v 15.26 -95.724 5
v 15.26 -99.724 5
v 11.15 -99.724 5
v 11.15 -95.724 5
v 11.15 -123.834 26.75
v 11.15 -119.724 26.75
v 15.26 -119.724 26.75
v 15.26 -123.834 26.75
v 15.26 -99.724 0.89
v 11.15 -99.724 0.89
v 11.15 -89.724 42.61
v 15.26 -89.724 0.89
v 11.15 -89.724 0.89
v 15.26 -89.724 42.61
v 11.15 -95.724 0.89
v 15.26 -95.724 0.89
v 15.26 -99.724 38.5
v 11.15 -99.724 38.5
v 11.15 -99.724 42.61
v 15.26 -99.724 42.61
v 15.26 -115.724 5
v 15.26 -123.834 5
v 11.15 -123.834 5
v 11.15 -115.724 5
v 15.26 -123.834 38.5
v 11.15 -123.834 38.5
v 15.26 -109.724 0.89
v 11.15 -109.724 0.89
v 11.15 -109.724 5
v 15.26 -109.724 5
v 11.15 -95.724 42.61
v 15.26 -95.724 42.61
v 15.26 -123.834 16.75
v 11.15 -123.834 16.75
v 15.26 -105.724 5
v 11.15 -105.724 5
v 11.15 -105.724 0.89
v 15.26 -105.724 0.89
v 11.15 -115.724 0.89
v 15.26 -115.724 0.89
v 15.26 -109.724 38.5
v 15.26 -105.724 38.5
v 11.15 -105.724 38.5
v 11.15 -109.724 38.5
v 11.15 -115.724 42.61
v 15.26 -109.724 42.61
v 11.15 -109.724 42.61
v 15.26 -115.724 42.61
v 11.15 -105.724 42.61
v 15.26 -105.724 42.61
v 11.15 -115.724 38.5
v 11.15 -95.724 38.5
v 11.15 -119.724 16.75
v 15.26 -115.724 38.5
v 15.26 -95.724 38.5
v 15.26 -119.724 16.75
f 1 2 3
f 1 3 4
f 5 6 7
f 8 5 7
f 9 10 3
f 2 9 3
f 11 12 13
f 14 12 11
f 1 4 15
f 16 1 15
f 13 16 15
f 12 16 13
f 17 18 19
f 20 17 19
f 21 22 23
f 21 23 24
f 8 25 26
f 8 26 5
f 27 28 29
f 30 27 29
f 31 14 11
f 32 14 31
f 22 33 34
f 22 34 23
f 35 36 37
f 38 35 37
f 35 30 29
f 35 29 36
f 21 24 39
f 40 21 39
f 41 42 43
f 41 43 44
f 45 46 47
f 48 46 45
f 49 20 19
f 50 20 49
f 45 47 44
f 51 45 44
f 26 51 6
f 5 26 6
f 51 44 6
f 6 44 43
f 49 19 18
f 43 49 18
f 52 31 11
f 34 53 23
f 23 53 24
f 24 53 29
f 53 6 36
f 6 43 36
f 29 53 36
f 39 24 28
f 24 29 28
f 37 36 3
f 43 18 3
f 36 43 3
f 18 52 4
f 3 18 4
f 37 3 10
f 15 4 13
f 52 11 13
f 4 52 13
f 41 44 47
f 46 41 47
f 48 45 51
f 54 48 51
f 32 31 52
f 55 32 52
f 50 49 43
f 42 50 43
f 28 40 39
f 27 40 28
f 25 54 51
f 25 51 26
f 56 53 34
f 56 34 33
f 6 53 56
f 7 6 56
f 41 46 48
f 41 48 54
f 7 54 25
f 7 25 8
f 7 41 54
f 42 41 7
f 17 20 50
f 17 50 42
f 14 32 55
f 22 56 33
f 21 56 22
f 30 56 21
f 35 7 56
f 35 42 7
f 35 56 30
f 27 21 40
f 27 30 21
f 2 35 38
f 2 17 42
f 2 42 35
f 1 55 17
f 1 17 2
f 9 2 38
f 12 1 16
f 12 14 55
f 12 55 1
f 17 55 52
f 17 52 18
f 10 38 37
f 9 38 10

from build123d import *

# Parameters (mm, degrees)
BOSS_EXTRUDE1_DEPTH     = 4.11
PADDLE_MASTER_START     = 16.75
PADDLE_MASTER_OUTLINE_W = 4.11
PADDLE_MASTER_OUTLINE_H = 4.11
PADDLE_MASTER_DEPTH     = 10


# Read off the part's stored shape, not the designer's step: paddle_master
with BuildPart() as part:
    # motor_support_side-paddle_master<2> → Boss-Extrude1 (new body)
    with BuildSketch(Plane(origin=(15.26, -123.833512511, 38.5), x_dir=(0, 0, -1), z_dir=(1, 0, 0))):
        Polygon((33.5, 34.11), (0, 34.11), (-4.11, 34.11), (-4.11, 28.11), (0, 28.11), (0, 24.11), (-4.11, 24.11), (-4.11, 18.11), (0, 18.11), (0, 14.11), (-4.11, 14.11), (-4.11, 8.11), (0, 8.11), (0, 0), (33.5, 0), (33.5, 8.11), (37.61, 8.11), (37.61, 14.11), (33.5, 14.11), (33.5, 18.11), (37.61, 18.11), (37.61, 24.11), (33.5, 24.11), (33.5, 28.11), (37.61, 28.11), (37.61, 34.11), align=None)
    extrude(amount=-BOSS_EXTRUDE1_DEPTH)

    # paddle_master outline → paddle_master (cut)
    with BuildSketch(Plane.XY.offset(PADDLE_MASTER_START)):
        with Locations((13.205, -121.778512511)):
            Rectangle(PADDLE_MASTER_OUTLINE_W, PADDLE_MASTER_OUTLINE_H)
    extrude(amount=PADDLE_MASTER_DEPTH, mode=Mode.SUBTRACT)


solid = part.part
